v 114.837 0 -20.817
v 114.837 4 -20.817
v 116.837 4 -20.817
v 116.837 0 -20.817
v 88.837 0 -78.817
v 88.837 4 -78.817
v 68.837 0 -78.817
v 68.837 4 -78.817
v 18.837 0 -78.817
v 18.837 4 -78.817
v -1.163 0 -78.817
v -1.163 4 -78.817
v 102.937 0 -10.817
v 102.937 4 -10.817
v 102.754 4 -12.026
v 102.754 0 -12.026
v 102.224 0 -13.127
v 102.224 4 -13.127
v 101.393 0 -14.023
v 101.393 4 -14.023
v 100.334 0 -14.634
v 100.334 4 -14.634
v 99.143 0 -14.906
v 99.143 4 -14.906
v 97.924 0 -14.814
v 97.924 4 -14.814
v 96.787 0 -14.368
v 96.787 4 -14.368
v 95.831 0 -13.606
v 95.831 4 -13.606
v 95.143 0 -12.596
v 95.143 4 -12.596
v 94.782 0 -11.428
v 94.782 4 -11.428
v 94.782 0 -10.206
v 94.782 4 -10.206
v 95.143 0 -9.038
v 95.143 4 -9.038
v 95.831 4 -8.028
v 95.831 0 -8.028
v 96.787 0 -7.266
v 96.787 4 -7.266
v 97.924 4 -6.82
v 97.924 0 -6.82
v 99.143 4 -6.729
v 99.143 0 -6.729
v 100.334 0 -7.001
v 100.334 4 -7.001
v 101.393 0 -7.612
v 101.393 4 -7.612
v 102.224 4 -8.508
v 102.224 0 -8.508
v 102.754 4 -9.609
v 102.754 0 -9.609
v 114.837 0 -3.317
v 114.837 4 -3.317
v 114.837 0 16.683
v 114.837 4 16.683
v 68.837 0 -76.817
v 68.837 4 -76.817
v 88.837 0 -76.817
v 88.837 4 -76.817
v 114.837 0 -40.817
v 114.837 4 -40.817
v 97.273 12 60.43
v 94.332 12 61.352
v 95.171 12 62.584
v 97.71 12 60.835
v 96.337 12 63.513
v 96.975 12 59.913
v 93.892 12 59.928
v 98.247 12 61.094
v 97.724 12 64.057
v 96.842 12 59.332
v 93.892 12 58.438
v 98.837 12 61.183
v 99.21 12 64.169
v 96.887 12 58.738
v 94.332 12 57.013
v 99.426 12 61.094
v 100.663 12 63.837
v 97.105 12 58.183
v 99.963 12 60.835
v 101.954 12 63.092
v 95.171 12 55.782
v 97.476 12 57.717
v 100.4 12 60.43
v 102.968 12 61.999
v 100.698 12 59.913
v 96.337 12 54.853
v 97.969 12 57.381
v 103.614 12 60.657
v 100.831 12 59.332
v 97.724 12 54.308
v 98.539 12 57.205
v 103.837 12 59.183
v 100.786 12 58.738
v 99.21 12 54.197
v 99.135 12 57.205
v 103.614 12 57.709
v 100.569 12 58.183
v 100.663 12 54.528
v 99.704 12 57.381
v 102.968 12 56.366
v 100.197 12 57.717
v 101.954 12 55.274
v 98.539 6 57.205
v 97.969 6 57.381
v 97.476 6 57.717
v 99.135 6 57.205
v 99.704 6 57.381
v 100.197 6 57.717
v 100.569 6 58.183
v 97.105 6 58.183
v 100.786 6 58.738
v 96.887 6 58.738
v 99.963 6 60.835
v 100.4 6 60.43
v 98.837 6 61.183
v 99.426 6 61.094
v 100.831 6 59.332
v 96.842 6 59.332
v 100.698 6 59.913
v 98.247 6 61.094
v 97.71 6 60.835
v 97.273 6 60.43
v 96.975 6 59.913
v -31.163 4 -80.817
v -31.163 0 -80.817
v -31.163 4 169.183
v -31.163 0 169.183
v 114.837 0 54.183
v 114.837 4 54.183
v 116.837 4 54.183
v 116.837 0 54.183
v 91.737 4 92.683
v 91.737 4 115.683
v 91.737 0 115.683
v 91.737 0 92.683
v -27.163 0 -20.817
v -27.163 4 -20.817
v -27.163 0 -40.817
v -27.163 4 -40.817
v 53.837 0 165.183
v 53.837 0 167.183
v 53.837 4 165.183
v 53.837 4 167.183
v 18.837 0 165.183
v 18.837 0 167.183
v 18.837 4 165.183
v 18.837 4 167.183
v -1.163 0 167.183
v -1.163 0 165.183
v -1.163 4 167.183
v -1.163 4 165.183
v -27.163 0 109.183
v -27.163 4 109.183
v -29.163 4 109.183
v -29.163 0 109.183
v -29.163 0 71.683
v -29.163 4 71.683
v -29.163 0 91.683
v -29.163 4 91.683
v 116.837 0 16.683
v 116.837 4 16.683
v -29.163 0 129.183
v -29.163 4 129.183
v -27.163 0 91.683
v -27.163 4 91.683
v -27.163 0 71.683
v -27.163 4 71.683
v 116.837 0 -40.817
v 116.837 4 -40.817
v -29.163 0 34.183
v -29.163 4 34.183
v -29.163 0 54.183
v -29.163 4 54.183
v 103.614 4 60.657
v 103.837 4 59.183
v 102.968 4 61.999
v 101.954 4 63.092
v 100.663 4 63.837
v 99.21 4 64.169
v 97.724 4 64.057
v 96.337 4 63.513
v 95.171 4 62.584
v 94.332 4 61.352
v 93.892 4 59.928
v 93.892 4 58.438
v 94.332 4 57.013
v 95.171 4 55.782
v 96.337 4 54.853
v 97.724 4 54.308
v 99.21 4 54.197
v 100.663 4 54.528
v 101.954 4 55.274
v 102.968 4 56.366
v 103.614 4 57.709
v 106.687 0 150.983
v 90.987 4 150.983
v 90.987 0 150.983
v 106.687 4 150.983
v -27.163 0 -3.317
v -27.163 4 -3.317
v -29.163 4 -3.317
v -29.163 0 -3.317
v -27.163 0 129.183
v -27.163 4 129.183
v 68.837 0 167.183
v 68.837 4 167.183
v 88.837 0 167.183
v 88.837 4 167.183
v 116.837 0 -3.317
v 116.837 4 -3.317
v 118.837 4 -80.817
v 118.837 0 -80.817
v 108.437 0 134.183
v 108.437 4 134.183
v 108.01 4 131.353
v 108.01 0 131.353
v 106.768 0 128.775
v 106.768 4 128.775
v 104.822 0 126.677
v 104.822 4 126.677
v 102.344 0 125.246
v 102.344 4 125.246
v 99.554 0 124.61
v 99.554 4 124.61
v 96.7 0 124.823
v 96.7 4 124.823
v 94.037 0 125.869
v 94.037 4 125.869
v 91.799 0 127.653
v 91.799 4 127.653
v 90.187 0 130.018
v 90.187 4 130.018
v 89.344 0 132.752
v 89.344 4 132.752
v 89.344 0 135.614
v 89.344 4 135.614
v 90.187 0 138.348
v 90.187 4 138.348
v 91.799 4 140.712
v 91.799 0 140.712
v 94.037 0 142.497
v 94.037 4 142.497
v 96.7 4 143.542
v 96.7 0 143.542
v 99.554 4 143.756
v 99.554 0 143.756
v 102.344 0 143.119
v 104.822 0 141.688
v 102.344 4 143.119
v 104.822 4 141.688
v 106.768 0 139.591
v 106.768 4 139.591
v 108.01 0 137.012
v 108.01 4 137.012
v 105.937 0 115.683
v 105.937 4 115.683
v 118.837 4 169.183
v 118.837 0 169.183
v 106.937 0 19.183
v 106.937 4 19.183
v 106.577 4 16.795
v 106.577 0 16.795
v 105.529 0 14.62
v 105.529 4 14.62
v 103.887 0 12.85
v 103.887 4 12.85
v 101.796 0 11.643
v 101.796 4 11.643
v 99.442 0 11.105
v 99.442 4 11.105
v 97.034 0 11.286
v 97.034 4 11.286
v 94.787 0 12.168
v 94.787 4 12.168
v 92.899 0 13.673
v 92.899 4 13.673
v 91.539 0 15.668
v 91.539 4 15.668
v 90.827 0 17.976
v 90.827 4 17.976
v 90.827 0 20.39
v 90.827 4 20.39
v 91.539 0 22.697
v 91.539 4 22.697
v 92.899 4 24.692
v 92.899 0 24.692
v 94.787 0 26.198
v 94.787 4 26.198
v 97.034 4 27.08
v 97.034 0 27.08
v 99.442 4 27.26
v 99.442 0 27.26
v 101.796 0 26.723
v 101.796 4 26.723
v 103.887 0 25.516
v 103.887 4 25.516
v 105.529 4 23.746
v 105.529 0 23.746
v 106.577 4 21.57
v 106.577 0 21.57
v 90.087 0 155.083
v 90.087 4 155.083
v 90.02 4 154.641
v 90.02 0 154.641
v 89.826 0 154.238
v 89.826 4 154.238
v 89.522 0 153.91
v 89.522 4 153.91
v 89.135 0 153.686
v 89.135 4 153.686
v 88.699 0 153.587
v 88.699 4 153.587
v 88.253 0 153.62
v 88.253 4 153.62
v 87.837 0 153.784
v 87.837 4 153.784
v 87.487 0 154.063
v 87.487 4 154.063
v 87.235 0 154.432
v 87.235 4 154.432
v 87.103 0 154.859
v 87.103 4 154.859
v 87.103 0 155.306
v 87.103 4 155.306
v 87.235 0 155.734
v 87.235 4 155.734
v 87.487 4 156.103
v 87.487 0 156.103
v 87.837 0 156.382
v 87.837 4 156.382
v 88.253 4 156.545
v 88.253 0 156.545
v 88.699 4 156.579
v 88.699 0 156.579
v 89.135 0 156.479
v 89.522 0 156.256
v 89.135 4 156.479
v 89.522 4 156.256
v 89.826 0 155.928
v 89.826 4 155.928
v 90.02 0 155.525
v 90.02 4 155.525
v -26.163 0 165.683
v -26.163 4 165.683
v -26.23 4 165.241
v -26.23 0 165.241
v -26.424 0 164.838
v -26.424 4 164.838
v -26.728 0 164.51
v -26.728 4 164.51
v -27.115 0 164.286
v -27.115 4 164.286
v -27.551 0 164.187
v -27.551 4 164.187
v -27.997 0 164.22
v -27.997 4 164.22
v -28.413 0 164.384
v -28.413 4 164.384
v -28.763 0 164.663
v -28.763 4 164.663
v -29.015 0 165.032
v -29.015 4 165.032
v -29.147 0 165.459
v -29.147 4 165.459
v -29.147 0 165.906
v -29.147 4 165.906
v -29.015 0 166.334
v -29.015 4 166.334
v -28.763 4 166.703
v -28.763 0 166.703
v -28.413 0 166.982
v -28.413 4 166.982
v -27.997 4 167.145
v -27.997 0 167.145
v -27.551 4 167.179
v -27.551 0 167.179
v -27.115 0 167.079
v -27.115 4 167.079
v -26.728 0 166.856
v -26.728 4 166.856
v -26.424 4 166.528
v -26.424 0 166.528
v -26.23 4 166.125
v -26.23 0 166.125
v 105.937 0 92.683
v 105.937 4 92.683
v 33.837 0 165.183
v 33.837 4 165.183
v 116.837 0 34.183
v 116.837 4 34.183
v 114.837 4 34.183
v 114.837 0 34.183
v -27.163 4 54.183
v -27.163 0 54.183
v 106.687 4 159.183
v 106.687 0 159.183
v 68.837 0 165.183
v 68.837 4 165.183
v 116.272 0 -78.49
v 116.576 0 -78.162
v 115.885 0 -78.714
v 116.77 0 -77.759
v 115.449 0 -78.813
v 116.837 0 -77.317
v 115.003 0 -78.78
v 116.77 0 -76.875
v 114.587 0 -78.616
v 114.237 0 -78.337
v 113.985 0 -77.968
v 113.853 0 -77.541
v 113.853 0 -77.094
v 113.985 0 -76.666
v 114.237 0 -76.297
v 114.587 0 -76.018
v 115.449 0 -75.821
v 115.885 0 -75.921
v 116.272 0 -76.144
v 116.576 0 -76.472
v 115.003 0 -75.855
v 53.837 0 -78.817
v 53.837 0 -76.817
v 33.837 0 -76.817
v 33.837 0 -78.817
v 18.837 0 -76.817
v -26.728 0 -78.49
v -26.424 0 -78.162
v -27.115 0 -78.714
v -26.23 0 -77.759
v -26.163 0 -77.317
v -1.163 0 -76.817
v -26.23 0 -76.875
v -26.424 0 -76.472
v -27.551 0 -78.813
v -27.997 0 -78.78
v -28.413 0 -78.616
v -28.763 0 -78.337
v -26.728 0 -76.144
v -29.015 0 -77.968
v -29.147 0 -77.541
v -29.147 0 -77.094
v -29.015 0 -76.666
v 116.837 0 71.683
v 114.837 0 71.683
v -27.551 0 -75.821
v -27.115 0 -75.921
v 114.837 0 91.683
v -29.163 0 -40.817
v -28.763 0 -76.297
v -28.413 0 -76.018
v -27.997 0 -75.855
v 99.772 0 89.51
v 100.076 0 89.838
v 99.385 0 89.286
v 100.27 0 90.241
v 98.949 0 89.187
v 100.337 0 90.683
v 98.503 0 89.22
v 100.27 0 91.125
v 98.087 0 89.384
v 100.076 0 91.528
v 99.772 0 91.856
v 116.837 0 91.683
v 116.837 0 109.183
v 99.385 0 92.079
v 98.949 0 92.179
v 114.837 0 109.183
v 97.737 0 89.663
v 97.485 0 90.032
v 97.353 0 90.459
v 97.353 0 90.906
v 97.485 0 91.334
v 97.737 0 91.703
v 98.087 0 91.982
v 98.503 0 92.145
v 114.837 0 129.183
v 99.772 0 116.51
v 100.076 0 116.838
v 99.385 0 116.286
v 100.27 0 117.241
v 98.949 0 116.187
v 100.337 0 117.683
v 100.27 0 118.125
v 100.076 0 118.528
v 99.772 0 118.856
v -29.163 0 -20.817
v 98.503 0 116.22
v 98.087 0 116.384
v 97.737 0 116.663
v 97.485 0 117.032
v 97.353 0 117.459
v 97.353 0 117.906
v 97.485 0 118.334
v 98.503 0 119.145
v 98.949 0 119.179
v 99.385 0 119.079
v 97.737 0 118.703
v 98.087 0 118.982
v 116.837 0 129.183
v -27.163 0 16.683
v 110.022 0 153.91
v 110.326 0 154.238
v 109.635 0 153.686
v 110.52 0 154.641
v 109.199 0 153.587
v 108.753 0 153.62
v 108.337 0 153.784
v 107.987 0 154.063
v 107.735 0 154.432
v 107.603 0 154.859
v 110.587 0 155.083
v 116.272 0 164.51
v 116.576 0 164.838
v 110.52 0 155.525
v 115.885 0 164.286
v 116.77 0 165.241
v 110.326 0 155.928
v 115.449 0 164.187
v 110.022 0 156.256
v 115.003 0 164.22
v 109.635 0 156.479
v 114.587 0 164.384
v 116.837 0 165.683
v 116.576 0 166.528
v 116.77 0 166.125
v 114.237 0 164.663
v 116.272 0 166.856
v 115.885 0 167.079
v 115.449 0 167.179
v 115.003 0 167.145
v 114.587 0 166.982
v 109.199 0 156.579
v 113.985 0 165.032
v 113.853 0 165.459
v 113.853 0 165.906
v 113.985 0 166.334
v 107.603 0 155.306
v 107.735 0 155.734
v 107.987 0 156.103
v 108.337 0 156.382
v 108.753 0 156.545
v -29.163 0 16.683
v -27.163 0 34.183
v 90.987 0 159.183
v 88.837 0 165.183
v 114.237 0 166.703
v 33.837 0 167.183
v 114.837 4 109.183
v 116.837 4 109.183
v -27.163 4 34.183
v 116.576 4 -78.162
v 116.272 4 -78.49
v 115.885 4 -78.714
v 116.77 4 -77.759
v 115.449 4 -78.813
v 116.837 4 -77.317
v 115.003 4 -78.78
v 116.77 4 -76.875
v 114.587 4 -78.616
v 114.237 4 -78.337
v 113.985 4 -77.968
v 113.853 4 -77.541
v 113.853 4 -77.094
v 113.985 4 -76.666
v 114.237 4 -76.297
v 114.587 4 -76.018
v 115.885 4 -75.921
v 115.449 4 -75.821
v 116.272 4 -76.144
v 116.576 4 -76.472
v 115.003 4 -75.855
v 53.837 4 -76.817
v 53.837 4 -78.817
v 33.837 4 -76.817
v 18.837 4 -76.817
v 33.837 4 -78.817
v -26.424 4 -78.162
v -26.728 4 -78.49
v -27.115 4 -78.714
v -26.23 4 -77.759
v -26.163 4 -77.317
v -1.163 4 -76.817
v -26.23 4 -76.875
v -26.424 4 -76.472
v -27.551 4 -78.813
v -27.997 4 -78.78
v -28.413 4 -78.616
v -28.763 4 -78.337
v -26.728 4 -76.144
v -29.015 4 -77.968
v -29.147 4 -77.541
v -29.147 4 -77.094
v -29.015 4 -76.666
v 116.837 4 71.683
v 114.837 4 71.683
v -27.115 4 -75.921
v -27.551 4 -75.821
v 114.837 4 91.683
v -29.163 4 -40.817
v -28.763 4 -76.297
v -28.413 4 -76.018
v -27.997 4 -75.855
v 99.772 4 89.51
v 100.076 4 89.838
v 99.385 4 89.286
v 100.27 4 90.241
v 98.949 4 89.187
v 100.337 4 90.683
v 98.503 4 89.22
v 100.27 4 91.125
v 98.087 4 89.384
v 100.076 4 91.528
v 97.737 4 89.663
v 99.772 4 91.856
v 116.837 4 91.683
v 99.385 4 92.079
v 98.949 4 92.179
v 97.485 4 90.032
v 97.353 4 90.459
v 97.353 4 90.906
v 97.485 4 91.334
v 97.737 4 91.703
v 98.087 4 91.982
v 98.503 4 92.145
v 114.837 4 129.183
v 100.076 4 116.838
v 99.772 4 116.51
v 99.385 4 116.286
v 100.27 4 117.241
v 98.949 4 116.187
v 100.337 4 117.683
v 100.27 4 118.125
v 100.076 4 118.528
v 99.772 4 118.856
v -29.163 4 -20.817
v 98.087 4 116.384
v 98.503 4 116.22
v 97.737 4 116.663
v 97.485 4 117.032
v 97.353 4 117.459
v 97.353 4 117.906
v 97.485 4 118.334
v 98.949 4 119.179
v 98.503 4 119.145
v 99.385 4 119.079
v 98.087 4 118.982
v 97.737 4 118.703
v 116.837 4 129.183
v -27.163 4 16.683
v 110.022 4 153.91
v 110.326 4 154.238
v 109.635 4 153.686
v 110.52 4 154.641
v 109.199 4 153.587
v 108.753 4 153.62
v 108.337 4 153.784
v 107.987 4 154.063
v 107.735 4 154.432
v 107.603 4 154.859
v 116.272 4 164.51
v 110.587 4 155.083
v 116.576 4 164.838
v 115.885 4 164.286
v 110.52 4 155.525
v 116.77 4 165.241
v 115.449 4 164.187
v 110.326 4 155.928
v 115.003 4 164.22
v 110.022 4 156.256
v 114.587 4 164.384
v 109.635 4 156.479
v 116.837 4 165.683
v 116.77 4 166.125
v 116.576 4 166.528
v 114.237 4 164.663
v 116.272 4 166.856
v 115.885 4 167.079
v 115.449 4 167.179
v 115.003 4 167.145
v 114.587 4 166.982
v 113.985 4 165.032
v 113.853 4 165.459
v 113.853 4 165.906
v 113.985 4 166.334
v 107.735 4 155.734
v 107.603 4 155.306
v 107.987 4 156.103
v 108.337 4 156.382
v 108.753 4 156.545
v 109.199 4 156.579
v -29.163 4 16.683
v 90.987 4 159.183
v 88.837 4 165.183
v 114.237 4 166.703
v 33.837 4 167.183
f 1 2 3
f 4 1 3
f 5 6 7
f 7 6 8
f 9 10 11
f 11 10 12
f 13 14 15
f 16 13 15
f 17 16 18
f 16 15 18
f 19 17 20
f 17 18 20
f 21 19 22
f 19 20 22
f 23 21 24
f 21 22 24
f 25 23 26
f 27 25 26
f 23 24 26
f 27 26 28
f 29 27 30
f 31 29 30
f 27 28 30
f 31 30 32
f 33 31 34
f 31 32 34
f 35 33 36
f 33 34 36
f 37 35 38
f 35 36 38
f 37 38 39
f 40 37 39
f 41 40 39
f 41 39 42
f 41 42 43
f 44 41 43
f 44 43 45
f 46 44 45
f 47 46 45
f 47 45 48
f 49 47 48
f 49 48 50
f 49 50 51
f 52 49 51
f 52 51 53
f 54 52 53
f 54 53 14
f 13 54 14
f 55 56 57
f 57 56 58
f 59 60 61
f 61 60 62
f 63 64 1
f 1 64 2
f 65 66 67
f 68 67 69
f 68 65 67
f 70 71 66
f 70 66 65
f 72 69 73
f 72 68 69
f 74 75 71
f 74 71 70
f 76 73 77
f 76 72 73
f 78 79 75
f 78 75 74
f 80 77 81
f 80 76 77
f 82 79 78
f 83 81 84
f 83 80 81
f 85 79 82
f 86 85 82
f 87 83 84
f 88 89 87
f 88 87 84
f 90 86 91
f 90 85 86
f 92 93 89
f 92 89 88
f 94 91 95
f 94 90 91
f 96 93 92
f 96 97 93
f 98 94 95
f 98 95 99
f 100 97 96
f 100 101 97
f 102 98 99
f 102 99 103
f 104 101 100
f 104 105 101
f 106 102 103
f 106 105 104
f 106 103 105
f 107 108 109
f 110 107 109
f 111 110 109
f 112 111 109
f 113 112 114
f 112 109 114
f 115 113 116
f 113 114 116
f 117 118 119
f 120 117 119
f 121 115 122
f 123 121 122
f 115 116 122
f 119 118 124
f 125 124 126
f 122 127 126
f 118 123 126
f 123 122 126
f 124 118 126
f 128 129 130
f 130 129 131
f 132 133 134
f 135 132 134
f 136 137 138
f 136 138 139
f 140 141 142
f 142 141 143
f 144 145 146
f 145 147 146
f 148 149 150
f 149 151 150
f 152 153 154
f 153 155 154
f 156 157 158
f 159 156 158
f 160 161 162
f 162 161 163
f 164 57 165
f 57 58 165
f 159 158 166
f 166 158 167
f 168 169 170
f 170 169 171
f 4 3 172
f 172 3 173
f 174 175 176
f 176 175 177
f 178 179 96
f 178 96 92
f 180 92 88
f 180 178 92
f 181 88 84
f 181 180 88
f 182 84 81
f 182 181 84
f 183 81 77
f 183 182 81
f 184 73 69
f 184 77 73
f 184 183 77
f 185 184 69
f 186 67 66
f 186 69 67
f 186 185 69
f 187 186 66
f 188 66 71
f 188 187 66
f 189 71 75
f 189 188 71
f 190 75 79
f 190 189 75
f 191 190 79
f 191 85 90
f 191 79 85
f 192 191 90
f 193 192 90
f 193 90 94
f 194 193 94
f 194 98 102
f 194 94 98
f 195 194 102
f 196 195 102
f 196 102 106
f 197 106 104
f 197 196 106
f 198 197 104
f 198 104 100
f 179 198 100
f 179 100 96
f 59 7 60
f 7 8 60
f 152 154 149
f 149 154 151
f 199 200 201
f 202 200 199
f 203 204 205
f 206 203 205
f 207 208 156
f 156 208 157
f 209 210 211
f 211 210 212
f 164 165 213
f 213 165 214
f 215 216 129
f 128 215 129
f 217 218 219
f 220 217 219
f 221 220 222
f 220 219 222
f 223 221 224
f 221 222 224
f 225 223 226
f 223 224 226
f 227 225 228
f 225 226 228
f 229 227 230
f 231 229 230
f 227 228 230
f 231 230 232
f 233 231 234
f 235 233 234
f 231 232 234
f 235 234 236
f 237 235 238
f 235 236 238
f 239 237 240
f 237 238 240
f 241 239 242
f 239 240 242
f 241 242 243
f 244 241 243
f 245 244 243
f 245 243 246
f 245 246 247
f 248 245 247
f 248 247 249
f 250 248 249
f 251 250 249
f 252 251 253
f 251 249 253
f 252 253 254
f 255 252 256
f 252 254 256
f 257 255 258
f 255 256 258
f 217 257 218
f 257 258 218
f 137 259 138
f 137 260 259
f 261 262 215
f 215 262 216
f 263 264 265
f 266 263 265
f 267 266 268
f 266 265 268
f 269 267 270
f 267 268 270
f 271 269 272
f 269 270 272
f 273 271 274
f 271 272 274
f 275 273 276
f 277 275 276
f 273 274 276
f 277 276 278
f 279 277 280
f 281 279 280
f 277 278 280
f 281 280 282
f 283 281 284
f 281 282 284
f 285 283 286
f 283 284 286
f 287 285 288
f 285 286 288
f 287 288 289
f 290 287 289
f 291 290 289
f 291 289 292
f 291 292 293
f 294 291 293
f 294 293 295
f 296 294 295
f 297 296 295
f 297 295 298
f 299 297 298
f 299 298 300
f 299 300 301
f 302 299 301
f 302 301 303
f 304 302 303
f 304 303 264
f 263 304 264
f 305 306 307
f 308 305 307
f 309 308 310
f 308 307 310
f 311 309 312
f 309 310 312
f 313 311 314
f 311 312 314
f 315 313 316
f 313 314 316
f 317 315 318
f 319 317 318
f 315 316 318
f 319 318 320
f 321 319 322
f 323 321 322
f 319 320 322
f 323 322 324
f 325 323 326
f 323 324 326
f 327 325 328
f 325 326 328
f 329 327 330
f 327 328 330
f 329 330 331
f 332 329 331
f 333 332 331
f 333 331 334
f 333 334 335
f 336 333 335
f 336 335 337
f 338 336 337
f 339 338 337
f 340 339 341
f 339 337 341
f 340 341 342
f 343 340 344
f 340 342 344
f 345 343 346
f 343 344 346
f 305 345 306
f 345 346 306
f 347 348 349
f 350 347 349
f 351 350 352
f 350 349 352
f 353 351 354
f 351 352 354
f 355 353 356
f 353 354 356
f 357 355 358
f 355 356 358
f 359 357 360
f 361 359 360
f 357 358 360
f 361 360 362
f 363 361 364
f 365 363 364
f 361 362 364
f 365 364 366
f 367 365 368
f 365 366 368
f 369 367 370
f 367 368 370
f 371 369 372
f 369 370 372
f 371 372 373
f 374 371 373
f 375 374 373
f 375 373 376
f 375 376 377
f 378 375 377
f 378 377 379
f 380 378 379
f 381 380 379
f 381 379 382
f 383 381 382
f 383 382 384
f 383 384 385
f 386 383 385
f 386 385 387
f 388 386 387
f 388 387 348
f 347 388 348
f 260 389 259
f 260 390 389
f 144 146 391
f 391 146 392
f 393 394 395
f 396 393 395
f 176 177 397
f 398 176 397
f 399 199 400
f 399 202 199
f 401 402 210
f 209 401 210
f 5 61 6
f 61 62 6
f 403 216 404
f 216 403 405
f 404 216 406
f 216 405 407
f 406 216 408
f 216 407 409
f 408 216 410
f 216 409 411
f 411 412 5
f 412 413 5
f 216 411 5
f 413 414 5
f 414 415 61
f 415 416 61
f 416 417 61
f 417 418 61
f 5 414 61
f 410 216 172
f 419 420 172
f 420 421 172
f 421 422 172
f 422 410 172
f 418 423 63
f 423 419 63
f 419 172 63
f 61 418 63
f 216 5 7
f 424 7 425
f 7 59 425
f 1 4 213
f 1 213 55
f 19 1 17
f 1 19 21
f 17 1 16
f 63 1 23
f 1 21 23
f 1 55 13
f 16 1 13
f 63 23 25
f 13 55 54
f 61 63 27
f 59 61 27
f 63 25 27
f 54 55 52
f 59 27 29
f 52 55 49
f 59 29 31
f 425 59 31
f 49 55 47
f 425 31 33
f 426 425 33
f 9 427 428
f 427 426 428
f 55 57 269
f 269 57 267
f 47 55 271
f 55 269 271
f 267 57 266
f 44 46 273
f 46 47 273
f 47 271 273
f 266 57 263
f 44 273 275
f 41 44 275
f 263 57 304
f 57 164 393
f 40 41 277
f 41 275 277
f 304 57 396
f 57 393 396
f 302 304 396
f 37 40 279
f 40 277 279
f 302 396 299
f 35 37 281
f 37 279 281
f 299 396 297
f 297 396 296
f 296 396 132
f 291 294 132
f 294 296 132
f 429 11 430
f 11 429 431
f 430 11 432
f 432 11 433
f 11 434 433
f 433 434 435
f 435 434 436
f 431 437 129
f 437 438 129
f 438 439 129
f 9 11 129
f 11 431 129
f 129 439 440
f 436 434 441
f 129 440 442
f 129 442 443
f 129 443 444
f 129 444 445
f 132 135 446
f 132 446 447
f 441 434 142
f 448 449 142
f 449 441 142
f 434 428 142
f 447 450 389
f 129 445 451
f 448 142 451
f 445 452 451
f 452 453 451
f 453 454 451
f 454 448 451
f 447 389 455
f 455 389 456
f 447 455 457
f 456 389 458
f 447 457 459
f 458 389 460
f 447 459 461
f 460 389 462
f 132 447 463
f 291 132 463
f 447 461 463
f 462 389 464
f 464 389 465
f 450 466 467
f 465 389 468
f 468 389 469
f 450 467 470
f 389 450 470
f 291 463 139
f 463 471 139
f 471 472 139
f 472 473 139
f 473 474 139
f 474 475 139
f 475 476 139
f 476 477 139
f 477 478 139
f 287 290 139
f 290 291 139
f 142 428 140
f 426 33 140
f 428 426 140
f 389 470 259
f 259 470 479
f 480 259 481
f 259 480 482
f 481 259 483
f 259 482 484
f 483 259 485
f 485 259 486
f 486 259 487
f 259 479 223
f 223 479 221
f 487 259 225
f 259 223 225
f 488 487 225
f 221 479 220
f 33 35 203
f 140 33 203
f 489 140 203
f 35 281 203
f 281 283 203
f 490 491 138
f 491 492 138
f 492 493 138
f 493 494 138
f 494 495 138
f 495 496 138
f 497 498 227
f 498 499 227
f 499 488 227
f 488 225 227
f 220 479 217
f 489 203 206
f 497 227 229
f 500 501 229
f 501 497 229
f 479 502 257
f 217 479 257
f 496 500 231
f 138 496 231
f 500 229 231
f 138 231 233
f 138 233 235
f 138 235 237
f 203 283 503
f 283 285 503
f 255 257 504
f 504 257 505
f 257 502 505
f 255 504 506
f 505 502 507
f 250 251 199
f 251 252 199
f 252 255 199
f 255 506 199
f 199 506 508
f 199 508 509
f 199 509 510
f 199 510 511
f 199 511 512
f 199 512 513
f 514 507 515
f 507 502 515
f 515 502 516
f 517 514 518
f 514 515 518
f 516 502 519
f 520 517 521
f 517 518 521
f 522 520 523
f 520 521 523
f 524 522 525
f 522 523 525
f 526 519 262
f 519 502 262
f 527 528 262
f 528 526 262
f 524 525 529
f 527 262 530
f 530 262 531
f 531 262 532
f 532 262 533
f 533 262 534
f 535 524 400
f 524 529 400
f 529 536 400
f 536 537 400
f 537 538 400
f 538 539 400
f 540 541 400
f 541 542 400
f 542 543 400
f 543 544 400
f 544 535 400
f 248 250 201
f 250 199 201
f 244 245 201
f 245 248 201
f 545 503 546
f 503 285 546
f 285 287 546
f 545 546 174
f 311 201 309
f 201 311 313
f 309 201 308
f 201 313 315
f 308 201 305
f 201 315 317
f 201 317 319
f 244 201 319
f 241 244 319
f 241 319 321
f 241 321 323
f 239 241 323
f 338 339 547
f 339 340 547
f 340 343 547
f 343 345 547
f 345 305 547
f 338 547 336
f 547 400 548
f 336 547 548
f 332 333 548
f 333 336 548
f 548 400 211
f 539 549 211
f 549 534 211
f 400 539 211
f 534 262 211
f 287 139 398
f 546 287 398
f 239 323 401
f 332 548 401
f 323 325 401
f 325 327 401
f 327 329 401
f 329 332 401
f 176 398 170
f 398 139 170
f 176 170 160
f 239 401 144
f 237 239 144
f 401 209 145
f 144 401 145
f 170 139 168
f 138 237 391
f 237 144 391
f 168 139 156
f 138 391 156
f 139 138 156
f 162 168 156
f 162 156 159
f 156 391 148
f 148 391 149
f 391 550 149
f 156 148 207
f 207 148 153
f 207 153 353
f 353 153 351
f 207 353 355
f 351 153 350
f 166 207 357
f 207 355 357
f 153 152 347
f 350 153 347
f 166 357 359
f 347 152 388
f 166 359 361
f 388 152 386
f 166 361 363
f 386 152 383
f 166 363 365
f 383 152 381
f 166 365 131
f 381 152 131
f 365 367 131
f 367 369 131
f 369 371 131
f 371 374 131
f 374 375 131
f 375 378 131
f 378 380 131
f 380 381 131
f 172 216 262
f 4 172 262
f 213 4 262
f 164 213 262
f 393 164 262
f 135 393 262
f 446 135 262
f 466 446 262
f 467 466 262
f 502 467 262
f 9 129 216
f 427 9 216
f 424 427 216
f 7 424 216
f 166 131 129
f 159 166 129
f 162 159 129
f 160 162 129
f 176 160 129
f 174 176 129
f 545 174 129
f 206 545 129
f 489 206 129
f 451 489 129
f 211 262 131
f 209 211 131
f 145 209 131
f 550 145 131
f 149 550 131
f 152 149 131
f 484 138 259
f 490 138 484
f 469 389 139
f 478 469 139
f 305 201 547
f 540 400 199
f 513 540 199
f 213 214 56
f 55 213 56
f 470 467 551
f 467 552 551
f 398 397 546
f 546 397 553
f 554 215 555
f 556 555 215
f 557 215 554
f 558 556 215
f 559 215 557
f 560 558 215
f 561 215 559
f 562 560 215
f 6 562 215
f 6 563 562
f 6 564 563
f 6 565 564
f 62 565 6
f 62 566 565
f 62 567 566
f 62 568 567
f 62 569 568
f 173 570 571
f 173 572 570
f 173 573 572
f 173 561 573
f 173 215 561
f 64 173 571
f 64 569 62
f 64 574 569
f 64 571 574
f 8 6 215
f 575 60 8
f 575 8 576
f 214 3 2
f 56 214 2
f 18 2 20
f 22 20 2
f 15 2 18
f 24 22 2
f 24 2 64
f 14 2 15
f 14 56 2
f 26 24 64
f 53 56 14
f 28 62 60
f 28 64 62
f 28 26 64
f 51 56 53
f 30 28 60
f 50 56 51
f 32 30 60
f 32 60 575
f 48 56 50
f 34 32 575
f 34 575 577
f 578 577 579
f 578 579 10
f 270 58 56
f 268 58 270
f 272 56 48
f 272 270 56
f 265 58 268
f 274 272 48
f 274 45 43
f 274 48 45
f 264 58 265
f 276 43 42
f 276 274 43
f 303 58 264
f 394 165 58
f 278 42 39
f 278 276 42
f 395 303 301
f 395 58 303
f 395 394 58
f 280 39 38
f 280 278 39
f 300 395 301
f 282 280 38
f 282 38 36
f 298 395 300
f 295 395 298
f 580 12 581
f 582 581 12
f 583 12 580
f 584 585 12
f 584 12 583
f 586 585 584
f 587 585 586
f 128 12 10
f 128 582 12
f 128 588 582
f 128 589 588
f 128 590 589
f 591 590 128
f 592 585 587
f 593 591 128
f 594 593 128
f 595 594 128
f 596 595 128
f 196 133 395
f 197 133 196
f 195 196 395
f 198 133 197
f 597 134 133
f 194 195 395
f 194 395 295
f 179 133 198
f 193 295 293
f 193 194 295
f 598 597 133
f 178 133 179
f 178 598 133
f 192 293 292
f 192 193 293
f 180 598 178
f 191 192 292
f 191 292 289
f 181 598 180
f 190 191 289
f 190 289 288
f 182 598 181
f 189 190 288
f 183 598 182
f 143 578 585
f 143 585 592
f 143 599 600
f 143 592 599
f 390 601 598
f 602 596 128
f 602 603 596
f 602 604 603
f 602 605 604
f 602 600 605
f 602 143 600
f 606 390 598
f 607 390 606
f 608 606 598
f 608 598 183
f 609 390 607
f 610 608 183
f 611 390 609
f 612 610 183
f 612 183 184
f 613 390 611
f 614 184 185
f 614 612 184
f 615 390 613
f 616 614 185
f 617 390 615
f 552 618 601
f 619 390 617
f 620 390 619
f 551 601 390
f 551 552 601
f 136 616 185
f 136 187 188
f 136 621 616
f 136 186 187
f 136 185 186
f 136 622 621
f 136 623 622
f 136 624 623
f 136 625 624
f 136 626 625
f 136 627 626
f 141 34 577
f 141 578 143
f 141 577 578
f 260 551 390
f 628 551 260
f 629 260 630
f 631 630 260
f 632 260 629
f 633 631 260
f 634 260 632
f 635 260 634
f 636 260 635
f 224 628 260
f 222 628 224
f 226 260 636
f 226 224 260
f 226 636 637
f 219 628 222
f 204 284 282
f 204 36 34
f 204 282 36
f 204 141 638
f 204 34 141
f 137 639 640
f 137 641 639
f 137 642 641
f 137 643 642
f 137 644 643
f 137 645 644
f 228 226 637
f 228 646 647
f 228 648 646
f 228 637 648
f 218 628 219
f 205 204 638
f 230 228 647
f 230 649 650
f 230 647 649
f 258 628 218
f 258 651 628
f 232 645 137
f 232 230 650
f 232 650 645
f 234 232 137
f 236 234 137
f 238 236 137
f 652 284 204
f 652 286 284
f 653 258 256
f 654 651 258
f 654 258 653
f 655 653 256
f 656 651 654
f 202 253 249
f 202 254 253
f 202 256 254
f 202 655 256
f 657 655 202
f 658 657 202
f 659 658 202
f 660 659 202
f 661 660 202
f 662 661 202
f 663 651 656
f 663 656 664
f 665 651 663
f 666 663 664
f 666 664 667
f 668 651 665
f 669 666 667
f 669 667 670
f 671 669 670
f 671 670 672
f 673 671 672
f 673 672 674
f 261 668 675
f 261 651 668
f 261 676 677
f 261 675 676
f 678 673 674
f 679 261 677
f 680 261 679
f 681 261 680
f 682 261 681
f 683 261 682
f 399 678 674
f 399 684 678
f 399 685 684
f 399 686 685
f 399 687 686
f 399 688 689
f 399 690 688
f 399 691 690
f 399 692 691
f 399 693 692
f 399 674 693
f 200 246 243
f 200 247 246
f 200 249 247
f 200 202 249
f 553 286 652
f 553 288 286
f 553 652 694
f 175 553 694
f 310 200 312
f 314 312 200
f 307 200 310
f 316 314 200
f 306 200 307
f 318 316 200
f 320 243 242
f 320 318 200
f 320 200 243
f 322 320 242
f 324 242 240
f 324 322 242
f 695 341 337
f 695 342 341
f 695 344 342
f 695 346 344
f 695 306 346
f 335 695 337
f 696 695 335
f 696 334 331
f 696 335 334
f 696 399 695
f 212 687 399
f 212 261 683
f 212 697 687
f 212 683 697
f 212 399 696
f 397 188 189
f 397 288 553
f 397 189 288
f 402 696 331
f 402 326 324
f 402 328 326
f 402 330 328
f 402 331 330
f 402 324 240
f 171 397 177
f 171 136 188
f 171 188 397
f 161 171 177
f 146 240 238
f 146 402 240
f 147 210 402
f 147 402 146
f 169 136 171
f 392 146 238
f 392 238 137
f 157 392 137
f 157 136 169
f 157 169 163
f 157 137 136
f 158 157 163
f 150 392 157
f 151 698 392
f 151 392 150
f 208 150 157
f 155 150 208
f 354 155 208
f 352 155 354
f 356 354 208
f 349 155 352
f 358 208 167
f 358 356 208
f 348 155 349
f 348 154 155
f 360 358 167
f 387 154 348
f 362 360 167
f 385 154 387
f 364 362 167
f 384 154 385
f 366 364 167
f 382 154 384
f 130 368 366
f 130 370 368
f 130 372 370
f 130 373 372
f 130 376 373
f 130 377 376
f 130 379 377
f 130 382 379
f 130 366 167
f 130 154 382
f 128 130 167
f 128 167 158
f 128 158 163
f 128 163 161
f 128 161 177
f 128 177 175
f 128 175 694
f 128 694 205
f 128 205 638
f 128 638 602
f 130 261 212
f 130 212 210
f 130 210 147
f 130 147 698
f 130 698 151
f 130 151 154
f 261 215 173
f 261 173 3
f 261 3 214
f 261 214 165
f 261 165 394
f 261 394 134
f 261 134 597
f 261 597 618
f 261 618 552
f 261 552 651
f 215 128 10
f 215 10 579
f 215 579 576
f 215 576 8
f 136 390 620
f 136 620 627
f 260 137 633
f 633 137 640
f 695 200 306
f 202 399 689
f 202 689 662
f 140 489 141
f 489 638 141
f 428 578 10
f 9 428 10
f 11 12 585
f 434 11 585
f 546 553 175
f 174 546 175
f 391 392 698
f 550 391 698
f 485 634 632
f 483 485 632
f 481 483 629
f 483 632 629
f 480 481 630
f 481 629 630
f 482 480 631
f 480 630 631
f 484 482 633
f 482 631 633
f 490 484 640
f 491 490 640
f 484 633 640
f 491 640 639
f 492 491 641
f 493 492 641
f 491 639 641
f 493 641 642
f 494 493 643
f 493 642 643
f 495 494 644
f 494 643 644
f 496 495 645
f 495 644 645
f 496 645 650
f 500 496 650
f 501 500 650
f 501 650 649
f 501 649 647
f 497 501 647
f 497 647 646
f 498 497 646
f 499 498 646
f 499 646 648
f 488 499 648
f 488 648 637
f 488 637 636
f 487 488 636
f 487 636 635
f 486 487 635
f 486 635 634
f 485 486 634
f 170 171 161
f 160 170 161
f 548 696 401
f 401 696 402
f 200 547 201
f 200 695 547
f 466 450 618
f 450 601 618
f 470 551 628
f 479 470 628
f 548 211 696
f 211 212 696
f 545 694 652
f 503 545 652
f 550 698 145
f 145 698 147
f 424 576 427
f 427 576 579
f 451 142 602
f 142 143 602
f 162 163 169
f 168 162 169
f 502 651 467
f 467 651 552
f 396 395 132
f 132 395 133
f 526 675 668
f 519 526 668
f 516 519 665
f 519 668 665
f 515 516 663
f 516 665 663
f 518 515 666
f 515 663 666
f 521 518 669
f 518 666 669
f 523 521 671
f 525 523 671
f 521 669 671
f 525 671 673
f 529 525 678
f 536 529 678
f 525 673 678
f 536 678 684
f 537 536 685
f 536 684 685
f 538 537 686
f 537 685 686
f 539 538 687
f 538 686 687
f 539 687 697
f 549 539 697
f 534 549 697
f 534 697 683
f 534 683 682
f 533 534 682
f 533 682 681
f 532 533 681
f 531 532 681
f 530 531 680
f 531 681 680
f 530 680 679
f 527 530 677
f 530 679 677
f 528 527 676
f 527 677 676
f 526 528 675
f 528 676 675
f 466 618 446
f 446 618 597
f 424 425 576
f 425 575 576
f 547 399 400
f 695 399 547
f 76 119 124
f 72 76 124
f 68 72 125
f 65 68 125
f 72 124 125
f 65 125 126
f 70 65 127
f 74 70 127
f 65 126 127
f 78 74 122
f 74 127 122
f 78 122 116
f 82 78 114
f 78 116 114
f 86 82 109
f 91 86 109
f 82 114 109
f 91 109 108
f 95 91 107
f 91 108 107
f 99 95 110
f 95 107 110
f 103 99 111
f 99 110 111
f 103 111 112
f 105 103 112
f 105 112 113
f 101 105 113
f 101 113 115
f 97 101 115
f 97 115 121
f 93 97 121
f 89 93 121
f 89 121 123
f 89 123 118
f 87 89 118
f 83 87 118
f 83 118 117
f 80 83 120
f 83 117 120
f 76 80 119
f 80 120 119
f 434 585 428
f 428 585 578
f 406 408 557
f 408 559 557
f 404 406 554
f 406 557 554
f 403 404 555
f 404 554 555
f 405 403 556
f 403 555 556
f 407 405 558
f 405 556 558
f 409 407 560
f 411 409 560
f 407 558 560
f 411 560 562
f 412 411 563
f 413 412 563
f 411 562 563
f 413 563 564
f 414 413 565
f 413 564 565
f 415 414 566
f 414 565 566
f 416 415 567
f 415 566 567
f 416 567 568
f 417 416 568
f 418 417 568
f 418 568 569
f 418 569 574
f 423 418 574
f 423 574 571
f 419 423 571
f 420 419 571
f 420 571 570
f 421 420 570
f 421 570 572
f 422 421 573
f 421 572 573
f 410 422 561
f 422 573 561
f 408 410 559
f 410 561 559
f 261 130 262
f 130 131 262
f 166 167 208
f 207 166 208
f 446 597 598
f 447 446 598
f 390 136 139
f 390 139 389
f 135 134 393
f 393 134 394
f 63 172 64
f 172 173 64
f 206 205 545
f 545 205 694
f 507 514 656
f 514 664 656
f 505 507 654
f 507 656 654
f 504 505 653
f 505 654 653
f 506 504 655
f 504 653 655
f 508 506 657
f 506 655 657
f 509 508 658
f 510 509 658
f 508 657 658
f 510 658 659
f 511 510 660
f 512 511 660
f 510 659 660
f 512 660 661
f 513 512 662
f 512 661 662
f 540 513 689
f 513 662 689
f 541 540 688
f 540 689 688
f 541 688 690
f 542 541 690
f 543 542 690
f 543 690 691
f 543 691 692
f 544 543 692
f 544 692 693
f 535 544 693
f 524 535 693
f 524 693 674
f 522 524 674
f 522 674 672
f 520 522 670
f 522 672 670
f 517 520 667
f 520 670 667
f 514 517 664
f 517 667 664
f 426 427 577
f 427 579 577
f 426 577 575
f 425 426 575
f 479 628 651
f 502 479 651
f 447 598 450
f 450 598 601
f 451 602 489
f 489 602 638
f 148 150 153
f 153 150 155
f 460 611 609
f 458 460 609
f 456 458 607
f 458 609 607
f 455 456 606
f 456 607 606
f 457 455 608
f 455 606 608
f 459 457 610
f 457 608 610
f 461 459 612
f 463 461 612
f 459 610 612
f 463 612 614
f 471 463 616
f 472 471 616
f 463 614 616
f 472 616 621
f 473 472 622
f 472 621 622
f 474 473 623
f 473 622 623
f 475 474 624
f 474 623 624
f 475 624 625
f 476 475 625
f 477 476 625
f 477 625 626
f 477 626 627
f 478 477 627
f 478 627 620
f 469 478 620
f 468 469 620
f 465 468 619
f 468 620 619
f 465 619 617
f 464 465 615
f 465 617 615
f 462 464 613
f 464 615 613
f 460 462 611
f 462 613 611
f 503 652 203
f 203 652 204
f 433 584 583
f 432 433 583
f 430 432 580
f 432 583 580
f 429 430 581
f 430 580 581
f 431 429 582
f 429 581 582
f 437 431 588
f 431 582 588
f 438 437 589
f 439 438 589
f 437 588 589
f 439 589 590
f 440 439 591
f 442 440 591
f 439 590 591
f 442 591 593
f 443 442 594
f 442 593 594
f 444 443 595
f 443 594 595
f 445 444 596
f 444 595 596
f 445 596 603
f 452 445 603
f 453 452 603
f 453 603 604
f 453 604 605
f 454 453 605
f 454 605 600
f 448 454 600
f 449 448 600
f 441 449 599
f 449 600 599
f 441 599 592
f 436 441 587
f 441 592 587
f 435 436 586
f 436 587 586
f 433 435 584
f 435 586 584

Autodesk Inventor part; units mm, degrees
ref_plane "YZ Plane" through (0, 0, 0) normal (1, 0, 0) x (0, 1, 0)
ref_plane "XZ Plane" through (0, 0, 0) normal (0, 1, 0) x (-1, 0, 0)
ref_plane "XY Plane" through (0, 0, 0) normal (0, 0, 1) x (1, 0, 0)
sketch "Sketch1" plane through (0, 0, 0) normal (0, 1, 0) x (-1, 0, 0)
  line L0 (31.1634, 169.1828) -> (-118.8366, 169.1828)
  line L1 (-118.8366, 169.1828) -> (-118.8366, -80.8172)
  line L2 (-118.8366, -80.8172) -> (31.1634, -80.8172)
  line L3 (31.1634, -80.8172) -> (31.1634, 169.1828)
  point P0 (0, 0)
  dimension "d0" = 250
  dimension "d1" = 150
extrude "Extrusion1" add sketch "Sketch1" along normal blind 4
fillet "Fillet1" [suppressed]
sketch "Sketch2" plane through (0, 4, 0) normal (0, 1, 0) x (1, 0, 0)
  line L0 (-31.1634, 80.8172) -> (-31.1634, -169.1828) projected
  line L1 (-31.1634, -169.1828) -> (118.8366, -169.1828) projected
  line L2 (118.8366, -169.1828) -> (118.8366, 80.8172) projected
  line L3 (118.8366, 80.8172) -> (-31.1634, 80.8172) projected
  arc A0 (-21.1634, 76.8172) -> (-27.1634, 70.8172) centre (-21.1634, 70.8172) ccw
  arc A1 (114.8366, 70.8172) -> (108.8366, 76.8172) centre (108.8366, 70.8172) ccw
  arc A2 (108.8366, -165.1828) -> (114.8366, -159.1828) centre (108.8366, -159.1828) ccw
  arc A3 (-27.1634, -159.1828) -> (-21.1634, -165.1828) centre (-21.1634, -159.1828) ccw
  line L4 (108.8366, -165.1828) -> (98.8366, -165.1828)
  line L5 (-11.1634, -165.1828) -> (-21.1634, -165.1828)
  line L6 (-27.1634, -159.1828) -> (-27.1634, -149.1828)
  line L7 (-27.1634, 60.8172) -> (-27.1634, 70.8172)
  line L8 (-21.1634, 76.8172) -> (-11.1634, 76.8172)
  line L9 (98.8366, 76.8172) -> (108.8366, 76.8172)
  line L10 (114.8366, 70.8172) -> (114.8366, 60.8172)
  line L11 (114.8366, -149.1828) -> (114.8366, -159.1828)
  line L12 (-11.1634, -169.1828) -> (-11.1634, -165.1828)
  line L13 (-11.1634, 76.8172) -> (-11.1634, 80.8172)
  line L14 (-31.1634, 60.8172) -> (-27.1634, 60.8172)
  line L15 (114.8366, 60.8172) -> (118.8366, 60.8172)
  line L16 (98.8366, -169.1828) -> (98.8366, -165.1828)
  line L17 (98.8366, 76.8172) -> (98.8366, 80.8172)
  line L18 (-31.1634, -149.1828) -> (-27.1634, -149.1828)
  line L19 (114.8366, -149.1828) -> (118.8366, -149.1828)
  point P0 (0, 0)
  point P1 (114.8366, -154.1828)
  dimension "d12" = 4
  dimension "d13" = 20
  dimension "d14" = 4
extrude "Extrusion2" [suppressed]
sketch "Sketch3" plane through (0, 4, 0) normal (0, 1, 0) x (1, 0, 0)
  line L0 (-29.1634, -129.1828) -> (-27.1634, -129.1828)
  line L1 (-27.1634, -129.1828) -> (-27.1634, -109.1828)
  line L2 (-27.1634, -109.1828) -> (-29.1634, -109.1828)
  line L3 (-29.1634, -109.1828) -> (-29.1634, -129.1828)
  line L4 (-31.1634, 80.8172) -> (-31.1634, -169.1828) projected
  line L5 (-29.1634, -71.6828) -> (-29.1634, -91.6828)
  line L6 (-29.1634, -91.6828) -> (-27.1634, -91.6828)
  line L7 (-27.1634, -91.6828) -> (-27.1634, -71.6828)
  line L8 (-27.1634, -71.6828) -> (-29.1634, -71.6828)
  line L9 (-29.1634, -34.1828) -> (-29.1634, -54.1828)
  line L10 (-29.1634, -54.1828) -> (-27.1634, -54.1828)
  line L11 (-27.1634, -54.1828) -> (-27.1634, -34.1828)
  line L12 (-27.1634, -34.1828) -> (-29.1634, -34.1828)
  line L13 (-29.1634, 3.3172) -> (-29.1634, -16.6828)
  line L14 (-29.1634, -16.6828) -> (-27.1634, -16.6828)
  line L15 (-27.1634, -16.6828) -> (-27.1634, 3.3172)
  line L16 (-27.1634, 3.3172) -> (-29.1634, 3.3172)
  line L17 (-29.1634, 40.8172) -> (-29.1634, 20.8172)
  line L18 (-29.1634, 20.8172) -> (-27.1634, 20.8172)
  line L19 (-27.1634, 20.8172) -> (-27.1634, 40.8172)
  line L20 (-27.1634, 40.8172) -> (-29.1634, 40.8172)
  line L21 (-31.1634, -169.1828) -> (118.8366, -169.1828) projected
  line L22 (114.8366, -129.1828) -> (116.8366, -129.1828)
  line L23 (116.8366, -129.1828) -> (116.8366, -109.1828)
  line L24 (116.8366, -109.1828) -> (114.8366, -109.1828)
  line L25 (114.8366, -109.1828) -> (114.8366, -129.1828)
  line L26 (114.8366, -91.6828) -> (116.8366, -91.6828)
  line L27 (114.8366, -71.6828) -> (114.8366, -91.6828)
  line L28 (116.8366, -71.6828) -> (114.8366, -71.6828)
  line L29 (114.8366, -54.1828) -> (116.8366, -54.1828)
  line L30 (116.8366, -34.1828) -> (114.8366, -34.1828)
  line L31 (114.8366, -34.1828) -> (114.8366, -54.1828)
  line L32 (116.8366, -54.1828) -> (116.8366, -34.1828)
  line L33 (116.8366, -91.6828) -> (116.8366, -71.6828)
  line L34 (114.8366, -16.6828) -> (116.8366, -16.6828)
  line L35 (116.8366, -16.6828) -> (116.8366, 3.3172)
  line L36 (114.8366, 3.3172) -> (114.8366, -16.6828)
  line L37 (116.8366, 3.3172) -> (114.8366, 3.3172)
  line L38 (114.8366, 20.8172) -> (116.8366, 20.8172)
  line L39 (114.8366, 40.8172) -> (114.8366, 20.8172)
  line L40 (116.8366, 40.8172) -> (114.8366, 40.8172)
  line L41 (116.8366, 20.8172) -> (116.8366, 40.8172)
  line L42 (-1.1634, -167.1828) -> (18.8366, -167.1828)
  line L43 (18.8366, -167.1828) -> (18.8366, -165.1828)
  line L44 (18.8366, -165.1828) -> (-1.1634, -165.1828)
  line L45 (-1.1634, -165.1828) -> (-1.1634, -167.1828)
  line L46 (53.8366, -167.1828) -> (53.8366, -165.1828)
  line L47 (53.8366, -165.1828) -> (33.8366, -165.1828)
  line L48 (33.8366, -167.1828) -> (53.8366, -167.1828)
  line L49 (33.8366, -165.1828) -> (33.8366, -167.1828)
  line L50 (88.8366, -167.1828) -> (88.8366, -165.1828)
  line L51 (88.8366, -165.1828) -> (68.8366, -165.1828)
  line L52 (68.8366, -167.1828) -> (88.8366, -167.1828)
  line L53 (68.8366, -165.1828) -> (68.8366, -167.1828)
  line L54 (18.8366, 76.8172) -> (18.8366, 78.8172)
  line L55 (18.8366, 78.8172) -> (-1.1634, 78.8172)
  line L56 (-1.1634, 76.8172) -> (18.8366, 76.8172)
  line L57 (-1.1634, 78.8172) -> (-1.1634, 76.8172)
  line L58 (53.8366, 76.8172) -> (53.8366, 78.8172)
  line L59 (53.8366, 78.8172) -> (33.8366, 78.8172)
  line L60 (33.8366, 76.8172) -> (53.8366, 76.8172)
  line L61 (33.8366, 78.8172) -> (33.8366, 76.8172)
  line L62 (88.8366, 76.8172) -> (88.8366, 78.8172)
  line L63 (88.8366, 78.8172) -> (68.8366, 78.8172)
  line L64 (68.8366, 76.8172) -> (88.8366, 76.8172)
  line L65 (68.8366, 78.8172) -> (68.8366, 76.8172)
  point P0 (0, 0)
  dimension "d15" = 2
  dimension "d16" = 20
  dimension "d17" = 2
  dimension "d21" = 37.5
  dimension "d28" = 144
  dimension "d33" = 20
  dimension "d34" = 2
  dimension "d35" = 2
  dimension "d39" = 35
  dimension "d42" = 244
extrude "Extrusion3" cut sketch "Sketch3" against normal through all
sketch "Sketch4" plane through (0, 4, 0) normal (0, 1, 0) x (1, 0, 0)
  circle A0 centre (98.8366, -134.1828) radius 9.6
  line L0 (118.8366, -169.1828) -> (118.8366, 80.8172) projected
  line L1 (-31.1634, -169.1828) -> (118.8366, -169.1828) projected
  line L2 (91.7366, -92.6828) -> (105.9366, -92.6828)
  line L3 (105.9366, -92.6828) -> (105.9366, -115.6828)
  line L4 (105.9366, -115.6828) -> (91.7366, -115.6828)
  line L5 (91.7366, -115.6828) -> (91.7366, -92.6828)
  circle A1 centre (98.8366, -19.1828) radius 8.1
  line L6 (-31.1634, 80.8172) -> (-31.1634, -169.1828) projected
  circle A2 centre (98.8366, 10.8172) radius 4.1
  line L7 (90.9866, -150.9828) -> (106.6866, -150.9828)
  line L8 (106.6866, -150.9828) -> (106.6866, -159.1828)
  line L9 (106.6866, -159.1828) -> (90.9866, -159.1828)
  line L10 (90.9866, -159.1828) -> (90.9866, -150.9828)
  circle A3 centre (98.8366, -117.6828) radius 1.5
  circle A4 centre (98.8366, -90.6828) radius 1.5
  circle A5 centre (109.0866, -155.0828) radius 1.5
  circle A6 centre (88.5866, -155.0828) radius 1.5
  point P0 (0, 0)
  point P1 (105.9366, -104.1828)
  point P2 (98.8366, -115.6828)
  point P3 (91.7366, -104.1828)
  point P4 (98.8366, -150.9828)
  dimension "d47" = 19.2
  dimension "d50" = 20
  dimension "d51" = 35
  dimension "d52" = 14.2
  dimension "d53" = 23
  dimension "d54" = 30
  dimension "d56" = 0
  dimension "d57" = 16.2
  dimension "d59" = 130
  dimension "d60" = 150
  dimension "d61" = 8.2
  dimension "d62" = 30
  dimension "d73" = 15.7
  dimension "d74" = 8.2
  dimension "d75" = 0
  dimension "d76" = 10
  dimension "d89" = 3
  dimension "d90" = 3
  dimension "d91" = 27
  dimension "d92" = 13.5
  dimension "d93" = 3
  dimension "d94" = 3
  dimension "d95" = 20.5
  dimension "d96" = 10.25
extrude "Extrusion4" cut sketch "Sketch4" against normal blind 10
sketch "Sketch5" plane through (0, 4, 0) normal (0, 1, 0) x (1, 0, 0)
  circle A0 centre (98.8366, -59.1828) radius 5
  circle A1 centre (98.8366, -19.1828) radius 8.1 projected
  point P0 (0, 0)
  dimension "d63" = 10
  dimension "d77" = 40
extrude "Extrusion5" add sketch "Sketch5" along normal blind 8 contours A0
sketch "Sketch6" plane through (98.8366, 12, 59.1828) normal (0, 1, 0) x (1, 0, 0)
  circle A0 centre (0, 0) radius 5 projected
  point P0 (-98.8366, 59.1828)
hole "Hole1" at (98.8366, 12, 59.1828) direction (0, -1, 0) diameter 4 depth 6
sketch "Sketch7" plane through (0, 4, 0) normal (0, 1, 0) x (1, 0, 0)
  circle A0 centre (-27.6634, 77.3172) radius 1.5
  line L0 (118.8366, 80.8172) -> (-31.1634, 80.8172) projected
  line L1 (-31.1634, 80.8172) -> (-31.1634, -169.1828) projected
  point P0 (0, 0)
  dimension "d78" = 3
  dimension "d79" = 3.5
  dimension "d80" = 3.5
extrude "Extrusion6" cut sketch "Sketch7" against normal blind 10
pattern_linear "Rectangular Pattern1" count 2 spacing 243 along (0, 0, 1) count 2 spacing 143 along (1, 0, 0) of "Extrusion6"
equation "\"d96\" = 0.5 * d95"
properties part number "Enclosure_6"
